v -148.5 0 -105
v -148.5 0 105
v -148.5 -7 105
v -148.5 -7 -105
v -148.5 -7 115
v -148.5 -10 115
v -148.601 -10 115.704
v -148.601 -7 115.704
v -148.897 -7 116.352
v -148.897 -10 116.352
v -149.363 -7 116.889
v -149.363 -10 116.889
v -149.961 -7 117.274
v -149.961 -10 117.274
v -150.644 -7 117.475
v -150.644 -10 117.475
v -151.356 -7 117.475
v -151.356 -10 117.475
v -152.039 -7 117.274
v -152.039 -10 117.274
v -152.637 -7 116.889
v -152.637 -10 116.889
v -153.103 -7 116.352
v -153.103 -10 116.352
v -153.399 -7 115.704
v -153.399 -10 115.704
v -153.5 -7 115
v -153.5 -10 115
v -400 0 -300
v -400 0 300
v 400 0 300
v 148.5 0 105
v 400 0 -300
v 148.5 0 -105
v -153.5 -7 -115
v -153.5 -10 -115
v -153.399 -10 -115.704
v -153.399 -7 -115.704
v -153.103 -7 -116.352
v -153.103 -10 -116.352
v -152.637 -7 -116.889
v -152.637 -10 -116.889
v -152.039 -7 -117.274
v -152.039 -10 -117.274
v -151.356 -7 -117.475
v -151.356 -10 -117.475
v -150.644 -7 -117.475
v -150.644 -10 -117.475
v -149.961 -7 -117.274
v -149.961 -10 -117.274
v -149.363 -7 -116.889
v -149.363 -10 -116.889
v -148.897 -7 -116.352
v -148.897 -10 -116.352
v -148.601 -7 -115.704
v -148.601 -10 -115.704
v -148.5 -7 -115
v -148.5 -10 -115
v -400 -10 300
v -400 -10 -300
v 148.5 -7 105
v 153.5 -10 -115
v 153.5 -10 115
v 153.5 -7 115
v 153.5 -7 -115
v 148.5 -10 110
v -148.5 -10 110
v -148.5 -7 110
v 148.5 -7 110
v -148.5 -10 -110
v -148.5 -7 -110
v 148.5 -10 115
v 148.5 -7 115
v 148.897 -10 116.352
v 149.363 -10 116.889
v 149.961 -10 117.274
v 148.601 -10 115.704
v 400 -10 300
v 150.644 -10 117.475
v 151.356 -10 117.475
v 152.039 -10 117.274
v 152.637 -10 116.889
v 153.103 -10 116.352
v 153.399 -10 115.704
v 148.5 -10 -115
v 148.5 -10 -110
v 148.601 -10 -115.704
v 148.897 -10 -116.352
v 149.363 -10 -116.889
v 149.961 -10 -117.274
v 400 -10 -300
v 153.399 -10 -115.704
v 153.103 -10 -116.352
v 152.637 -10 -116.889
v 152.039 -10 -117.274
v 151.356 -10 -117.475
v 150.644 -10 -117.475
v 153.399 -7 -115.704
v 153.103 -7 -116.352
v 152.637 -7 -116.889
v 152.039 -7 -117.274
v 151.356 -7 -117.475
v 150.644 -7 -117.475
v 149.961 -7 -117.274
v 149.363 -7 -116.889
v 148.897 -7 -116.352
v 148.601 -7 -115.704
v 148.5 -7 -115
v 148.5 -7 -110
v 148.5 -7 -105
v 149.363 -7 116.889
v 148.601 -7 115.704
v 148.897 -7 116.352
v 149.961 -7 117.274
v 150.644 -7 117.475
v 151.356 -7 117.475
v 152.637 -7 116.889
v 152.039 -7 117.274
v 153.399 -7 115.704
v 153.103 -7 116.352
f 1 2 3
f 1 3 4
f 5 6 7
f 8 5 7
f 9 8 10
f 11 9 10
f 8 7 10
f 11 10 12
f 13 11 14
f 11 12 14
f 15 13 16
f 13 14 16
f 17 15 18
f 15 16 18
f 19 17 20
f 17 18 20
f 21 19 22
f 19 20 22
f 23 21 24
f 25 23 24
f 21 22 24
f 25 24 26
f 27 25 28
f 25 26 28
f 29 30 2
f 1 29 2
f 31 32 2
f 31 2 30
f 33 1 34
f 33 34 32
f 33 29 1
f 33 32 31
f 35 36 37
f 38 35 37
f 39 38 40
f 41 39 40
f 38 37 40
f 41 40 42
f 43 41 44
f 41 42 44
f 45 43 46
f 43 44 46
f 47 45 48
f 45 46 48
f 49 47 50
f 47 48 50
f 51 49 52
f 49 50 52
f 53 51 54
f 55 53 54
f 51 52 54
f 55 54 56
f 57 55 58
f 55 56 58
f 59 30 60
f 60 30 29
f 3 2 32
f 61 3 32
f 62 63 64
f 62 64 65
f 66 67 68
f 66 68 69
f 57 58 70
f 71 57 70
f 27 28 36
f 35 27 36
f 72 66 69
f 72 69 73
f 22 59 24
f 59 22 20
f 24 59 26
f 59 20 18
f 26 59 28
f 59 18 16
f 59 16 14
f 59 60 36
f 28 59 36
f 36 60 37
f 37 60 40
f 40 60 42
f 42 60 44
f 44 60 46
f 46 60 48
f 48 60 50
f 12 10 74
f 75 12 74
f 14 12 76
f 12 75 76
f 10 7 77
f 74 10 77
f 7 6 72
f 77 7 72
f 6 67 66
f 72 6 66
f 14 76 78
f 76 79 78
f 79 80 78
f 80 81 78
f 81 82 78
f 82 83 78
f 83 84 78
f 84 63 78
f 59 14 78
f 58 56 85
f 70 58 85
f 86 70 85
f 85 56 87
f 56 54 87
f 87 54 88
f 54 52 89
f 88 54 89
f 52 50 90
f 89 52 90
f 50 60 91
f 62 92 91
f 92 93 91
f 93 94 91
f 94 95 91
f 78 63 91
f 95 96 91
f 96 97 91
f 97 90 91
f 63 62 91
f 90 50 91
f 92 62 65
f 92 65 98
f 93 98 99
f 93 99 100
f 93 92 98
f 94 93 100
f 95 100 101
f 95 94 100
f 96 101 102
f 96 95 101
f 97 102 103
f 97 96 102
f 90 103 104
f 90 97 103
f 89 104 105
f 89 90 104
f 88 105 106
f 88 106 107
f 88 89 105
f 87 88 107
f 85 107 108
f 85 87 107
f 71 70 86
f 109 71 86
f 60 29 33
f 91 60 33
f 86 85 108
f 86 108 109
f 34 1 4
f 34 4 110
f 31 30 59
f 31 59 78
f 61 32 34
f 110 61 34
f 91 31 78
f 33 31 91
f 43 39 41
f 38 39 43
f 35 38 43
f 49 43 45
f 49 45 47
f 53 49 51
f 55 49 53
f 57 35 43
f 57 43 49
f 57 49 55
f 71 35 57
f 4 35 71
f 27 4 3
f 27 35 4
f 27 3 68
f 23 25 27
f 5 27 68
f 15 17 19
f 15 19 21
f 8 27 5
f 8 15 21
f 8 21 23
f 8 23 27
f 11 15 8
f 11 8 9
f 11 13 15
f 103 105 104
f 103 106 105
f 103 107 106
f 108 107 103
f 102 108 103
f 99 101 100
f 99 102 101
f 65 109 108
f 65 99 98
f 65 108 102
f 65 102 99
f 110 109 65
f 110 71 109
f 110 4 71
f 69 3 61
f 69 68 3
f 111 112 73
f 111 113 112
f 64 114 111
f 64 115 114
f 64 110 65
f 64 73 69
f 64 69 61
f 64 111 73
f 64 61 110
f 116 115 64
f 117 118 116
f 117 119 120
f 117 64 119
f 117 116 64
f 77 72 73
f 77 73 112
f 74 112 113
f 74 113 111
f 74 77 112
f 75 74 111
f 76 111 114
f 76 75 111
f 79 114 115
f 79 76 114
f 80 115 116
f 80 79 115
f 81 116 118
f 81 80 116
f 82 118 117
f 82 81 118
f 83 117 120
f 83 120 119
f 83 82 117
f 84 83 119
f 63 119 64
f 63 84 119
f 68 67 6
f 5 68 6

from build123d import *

# Parameters (mm, degrees)
SKETCH1_W      = 800
SKETCH1_H      = 600
SKETCH1_W_2    = 297
SKETCH1_H_2    = 210
EXTRUDE1_DEPTH = 10
EXTRUDE2_DEPTH = 3
SKETCH3_W      = 297
SKETCH3_H      = 5
EXTRUDE3_DEPTH = 3


with BuildPart() as part:
    # Sketch1 → Extrude1 (new body)
    with BuildSketch(Plane(origin=(0, 0, 0), x_dir=(1, 0, 0), z_dir=(0, 1, 0))):
        Rectangle(SKETCH1_W, SKETCH1_H)
        Rectangle(SKETCH1_W_2, SKETCH1_H_2, mode=Mode.SUBTRACT)
    extrude(amount=-EXTRUDE1_DEPTH)

    # Sketch2 → Extrude2 (cut)
    with BuildSketch(Plane.XZ.offset(10)):
        with BuildLine():
            Line((-148.5, -115), (-148.5, 115))
            ThreePointArc((-148.5, 115), (-151, 117.5), (-153.5, 115))
            Line((-153.5, 115), (-153.5, -115))
            ThreePointArc((-153.5, -115), (-151, -117.5), (-148.5, -115))
        make_face()
    extrude2 = extrude(amount=-EXTRUDE2_DEPTH, mode=Mode.SUBTRACT)

    # Mirror1: Extrude2 across plane
    add(extrude2.mirror(Plane(origin=(0, 0, 0), x_dir=(0, 0, 1), z_dir=(1, 0, 0))), mode=Mode.SUBTRACT)

    # Sketch3 → Extrude3 (cut)
    with BuildSketch(Plane.XZ.offset(10)):
        with Locations((0, 107.5)):
            Rectangle(SKETCH3_W, SKETCH3_H)
    extrude3 = extrude(amount=-EXTRUDE3_DEPTH, mode=Mode.SUBTRACT)

    # Mirror2: Extrude3 across plane
    add(extrude3.mirror(Plane.XY), mode=Mode.SUBTRACT)


solid = part.part
